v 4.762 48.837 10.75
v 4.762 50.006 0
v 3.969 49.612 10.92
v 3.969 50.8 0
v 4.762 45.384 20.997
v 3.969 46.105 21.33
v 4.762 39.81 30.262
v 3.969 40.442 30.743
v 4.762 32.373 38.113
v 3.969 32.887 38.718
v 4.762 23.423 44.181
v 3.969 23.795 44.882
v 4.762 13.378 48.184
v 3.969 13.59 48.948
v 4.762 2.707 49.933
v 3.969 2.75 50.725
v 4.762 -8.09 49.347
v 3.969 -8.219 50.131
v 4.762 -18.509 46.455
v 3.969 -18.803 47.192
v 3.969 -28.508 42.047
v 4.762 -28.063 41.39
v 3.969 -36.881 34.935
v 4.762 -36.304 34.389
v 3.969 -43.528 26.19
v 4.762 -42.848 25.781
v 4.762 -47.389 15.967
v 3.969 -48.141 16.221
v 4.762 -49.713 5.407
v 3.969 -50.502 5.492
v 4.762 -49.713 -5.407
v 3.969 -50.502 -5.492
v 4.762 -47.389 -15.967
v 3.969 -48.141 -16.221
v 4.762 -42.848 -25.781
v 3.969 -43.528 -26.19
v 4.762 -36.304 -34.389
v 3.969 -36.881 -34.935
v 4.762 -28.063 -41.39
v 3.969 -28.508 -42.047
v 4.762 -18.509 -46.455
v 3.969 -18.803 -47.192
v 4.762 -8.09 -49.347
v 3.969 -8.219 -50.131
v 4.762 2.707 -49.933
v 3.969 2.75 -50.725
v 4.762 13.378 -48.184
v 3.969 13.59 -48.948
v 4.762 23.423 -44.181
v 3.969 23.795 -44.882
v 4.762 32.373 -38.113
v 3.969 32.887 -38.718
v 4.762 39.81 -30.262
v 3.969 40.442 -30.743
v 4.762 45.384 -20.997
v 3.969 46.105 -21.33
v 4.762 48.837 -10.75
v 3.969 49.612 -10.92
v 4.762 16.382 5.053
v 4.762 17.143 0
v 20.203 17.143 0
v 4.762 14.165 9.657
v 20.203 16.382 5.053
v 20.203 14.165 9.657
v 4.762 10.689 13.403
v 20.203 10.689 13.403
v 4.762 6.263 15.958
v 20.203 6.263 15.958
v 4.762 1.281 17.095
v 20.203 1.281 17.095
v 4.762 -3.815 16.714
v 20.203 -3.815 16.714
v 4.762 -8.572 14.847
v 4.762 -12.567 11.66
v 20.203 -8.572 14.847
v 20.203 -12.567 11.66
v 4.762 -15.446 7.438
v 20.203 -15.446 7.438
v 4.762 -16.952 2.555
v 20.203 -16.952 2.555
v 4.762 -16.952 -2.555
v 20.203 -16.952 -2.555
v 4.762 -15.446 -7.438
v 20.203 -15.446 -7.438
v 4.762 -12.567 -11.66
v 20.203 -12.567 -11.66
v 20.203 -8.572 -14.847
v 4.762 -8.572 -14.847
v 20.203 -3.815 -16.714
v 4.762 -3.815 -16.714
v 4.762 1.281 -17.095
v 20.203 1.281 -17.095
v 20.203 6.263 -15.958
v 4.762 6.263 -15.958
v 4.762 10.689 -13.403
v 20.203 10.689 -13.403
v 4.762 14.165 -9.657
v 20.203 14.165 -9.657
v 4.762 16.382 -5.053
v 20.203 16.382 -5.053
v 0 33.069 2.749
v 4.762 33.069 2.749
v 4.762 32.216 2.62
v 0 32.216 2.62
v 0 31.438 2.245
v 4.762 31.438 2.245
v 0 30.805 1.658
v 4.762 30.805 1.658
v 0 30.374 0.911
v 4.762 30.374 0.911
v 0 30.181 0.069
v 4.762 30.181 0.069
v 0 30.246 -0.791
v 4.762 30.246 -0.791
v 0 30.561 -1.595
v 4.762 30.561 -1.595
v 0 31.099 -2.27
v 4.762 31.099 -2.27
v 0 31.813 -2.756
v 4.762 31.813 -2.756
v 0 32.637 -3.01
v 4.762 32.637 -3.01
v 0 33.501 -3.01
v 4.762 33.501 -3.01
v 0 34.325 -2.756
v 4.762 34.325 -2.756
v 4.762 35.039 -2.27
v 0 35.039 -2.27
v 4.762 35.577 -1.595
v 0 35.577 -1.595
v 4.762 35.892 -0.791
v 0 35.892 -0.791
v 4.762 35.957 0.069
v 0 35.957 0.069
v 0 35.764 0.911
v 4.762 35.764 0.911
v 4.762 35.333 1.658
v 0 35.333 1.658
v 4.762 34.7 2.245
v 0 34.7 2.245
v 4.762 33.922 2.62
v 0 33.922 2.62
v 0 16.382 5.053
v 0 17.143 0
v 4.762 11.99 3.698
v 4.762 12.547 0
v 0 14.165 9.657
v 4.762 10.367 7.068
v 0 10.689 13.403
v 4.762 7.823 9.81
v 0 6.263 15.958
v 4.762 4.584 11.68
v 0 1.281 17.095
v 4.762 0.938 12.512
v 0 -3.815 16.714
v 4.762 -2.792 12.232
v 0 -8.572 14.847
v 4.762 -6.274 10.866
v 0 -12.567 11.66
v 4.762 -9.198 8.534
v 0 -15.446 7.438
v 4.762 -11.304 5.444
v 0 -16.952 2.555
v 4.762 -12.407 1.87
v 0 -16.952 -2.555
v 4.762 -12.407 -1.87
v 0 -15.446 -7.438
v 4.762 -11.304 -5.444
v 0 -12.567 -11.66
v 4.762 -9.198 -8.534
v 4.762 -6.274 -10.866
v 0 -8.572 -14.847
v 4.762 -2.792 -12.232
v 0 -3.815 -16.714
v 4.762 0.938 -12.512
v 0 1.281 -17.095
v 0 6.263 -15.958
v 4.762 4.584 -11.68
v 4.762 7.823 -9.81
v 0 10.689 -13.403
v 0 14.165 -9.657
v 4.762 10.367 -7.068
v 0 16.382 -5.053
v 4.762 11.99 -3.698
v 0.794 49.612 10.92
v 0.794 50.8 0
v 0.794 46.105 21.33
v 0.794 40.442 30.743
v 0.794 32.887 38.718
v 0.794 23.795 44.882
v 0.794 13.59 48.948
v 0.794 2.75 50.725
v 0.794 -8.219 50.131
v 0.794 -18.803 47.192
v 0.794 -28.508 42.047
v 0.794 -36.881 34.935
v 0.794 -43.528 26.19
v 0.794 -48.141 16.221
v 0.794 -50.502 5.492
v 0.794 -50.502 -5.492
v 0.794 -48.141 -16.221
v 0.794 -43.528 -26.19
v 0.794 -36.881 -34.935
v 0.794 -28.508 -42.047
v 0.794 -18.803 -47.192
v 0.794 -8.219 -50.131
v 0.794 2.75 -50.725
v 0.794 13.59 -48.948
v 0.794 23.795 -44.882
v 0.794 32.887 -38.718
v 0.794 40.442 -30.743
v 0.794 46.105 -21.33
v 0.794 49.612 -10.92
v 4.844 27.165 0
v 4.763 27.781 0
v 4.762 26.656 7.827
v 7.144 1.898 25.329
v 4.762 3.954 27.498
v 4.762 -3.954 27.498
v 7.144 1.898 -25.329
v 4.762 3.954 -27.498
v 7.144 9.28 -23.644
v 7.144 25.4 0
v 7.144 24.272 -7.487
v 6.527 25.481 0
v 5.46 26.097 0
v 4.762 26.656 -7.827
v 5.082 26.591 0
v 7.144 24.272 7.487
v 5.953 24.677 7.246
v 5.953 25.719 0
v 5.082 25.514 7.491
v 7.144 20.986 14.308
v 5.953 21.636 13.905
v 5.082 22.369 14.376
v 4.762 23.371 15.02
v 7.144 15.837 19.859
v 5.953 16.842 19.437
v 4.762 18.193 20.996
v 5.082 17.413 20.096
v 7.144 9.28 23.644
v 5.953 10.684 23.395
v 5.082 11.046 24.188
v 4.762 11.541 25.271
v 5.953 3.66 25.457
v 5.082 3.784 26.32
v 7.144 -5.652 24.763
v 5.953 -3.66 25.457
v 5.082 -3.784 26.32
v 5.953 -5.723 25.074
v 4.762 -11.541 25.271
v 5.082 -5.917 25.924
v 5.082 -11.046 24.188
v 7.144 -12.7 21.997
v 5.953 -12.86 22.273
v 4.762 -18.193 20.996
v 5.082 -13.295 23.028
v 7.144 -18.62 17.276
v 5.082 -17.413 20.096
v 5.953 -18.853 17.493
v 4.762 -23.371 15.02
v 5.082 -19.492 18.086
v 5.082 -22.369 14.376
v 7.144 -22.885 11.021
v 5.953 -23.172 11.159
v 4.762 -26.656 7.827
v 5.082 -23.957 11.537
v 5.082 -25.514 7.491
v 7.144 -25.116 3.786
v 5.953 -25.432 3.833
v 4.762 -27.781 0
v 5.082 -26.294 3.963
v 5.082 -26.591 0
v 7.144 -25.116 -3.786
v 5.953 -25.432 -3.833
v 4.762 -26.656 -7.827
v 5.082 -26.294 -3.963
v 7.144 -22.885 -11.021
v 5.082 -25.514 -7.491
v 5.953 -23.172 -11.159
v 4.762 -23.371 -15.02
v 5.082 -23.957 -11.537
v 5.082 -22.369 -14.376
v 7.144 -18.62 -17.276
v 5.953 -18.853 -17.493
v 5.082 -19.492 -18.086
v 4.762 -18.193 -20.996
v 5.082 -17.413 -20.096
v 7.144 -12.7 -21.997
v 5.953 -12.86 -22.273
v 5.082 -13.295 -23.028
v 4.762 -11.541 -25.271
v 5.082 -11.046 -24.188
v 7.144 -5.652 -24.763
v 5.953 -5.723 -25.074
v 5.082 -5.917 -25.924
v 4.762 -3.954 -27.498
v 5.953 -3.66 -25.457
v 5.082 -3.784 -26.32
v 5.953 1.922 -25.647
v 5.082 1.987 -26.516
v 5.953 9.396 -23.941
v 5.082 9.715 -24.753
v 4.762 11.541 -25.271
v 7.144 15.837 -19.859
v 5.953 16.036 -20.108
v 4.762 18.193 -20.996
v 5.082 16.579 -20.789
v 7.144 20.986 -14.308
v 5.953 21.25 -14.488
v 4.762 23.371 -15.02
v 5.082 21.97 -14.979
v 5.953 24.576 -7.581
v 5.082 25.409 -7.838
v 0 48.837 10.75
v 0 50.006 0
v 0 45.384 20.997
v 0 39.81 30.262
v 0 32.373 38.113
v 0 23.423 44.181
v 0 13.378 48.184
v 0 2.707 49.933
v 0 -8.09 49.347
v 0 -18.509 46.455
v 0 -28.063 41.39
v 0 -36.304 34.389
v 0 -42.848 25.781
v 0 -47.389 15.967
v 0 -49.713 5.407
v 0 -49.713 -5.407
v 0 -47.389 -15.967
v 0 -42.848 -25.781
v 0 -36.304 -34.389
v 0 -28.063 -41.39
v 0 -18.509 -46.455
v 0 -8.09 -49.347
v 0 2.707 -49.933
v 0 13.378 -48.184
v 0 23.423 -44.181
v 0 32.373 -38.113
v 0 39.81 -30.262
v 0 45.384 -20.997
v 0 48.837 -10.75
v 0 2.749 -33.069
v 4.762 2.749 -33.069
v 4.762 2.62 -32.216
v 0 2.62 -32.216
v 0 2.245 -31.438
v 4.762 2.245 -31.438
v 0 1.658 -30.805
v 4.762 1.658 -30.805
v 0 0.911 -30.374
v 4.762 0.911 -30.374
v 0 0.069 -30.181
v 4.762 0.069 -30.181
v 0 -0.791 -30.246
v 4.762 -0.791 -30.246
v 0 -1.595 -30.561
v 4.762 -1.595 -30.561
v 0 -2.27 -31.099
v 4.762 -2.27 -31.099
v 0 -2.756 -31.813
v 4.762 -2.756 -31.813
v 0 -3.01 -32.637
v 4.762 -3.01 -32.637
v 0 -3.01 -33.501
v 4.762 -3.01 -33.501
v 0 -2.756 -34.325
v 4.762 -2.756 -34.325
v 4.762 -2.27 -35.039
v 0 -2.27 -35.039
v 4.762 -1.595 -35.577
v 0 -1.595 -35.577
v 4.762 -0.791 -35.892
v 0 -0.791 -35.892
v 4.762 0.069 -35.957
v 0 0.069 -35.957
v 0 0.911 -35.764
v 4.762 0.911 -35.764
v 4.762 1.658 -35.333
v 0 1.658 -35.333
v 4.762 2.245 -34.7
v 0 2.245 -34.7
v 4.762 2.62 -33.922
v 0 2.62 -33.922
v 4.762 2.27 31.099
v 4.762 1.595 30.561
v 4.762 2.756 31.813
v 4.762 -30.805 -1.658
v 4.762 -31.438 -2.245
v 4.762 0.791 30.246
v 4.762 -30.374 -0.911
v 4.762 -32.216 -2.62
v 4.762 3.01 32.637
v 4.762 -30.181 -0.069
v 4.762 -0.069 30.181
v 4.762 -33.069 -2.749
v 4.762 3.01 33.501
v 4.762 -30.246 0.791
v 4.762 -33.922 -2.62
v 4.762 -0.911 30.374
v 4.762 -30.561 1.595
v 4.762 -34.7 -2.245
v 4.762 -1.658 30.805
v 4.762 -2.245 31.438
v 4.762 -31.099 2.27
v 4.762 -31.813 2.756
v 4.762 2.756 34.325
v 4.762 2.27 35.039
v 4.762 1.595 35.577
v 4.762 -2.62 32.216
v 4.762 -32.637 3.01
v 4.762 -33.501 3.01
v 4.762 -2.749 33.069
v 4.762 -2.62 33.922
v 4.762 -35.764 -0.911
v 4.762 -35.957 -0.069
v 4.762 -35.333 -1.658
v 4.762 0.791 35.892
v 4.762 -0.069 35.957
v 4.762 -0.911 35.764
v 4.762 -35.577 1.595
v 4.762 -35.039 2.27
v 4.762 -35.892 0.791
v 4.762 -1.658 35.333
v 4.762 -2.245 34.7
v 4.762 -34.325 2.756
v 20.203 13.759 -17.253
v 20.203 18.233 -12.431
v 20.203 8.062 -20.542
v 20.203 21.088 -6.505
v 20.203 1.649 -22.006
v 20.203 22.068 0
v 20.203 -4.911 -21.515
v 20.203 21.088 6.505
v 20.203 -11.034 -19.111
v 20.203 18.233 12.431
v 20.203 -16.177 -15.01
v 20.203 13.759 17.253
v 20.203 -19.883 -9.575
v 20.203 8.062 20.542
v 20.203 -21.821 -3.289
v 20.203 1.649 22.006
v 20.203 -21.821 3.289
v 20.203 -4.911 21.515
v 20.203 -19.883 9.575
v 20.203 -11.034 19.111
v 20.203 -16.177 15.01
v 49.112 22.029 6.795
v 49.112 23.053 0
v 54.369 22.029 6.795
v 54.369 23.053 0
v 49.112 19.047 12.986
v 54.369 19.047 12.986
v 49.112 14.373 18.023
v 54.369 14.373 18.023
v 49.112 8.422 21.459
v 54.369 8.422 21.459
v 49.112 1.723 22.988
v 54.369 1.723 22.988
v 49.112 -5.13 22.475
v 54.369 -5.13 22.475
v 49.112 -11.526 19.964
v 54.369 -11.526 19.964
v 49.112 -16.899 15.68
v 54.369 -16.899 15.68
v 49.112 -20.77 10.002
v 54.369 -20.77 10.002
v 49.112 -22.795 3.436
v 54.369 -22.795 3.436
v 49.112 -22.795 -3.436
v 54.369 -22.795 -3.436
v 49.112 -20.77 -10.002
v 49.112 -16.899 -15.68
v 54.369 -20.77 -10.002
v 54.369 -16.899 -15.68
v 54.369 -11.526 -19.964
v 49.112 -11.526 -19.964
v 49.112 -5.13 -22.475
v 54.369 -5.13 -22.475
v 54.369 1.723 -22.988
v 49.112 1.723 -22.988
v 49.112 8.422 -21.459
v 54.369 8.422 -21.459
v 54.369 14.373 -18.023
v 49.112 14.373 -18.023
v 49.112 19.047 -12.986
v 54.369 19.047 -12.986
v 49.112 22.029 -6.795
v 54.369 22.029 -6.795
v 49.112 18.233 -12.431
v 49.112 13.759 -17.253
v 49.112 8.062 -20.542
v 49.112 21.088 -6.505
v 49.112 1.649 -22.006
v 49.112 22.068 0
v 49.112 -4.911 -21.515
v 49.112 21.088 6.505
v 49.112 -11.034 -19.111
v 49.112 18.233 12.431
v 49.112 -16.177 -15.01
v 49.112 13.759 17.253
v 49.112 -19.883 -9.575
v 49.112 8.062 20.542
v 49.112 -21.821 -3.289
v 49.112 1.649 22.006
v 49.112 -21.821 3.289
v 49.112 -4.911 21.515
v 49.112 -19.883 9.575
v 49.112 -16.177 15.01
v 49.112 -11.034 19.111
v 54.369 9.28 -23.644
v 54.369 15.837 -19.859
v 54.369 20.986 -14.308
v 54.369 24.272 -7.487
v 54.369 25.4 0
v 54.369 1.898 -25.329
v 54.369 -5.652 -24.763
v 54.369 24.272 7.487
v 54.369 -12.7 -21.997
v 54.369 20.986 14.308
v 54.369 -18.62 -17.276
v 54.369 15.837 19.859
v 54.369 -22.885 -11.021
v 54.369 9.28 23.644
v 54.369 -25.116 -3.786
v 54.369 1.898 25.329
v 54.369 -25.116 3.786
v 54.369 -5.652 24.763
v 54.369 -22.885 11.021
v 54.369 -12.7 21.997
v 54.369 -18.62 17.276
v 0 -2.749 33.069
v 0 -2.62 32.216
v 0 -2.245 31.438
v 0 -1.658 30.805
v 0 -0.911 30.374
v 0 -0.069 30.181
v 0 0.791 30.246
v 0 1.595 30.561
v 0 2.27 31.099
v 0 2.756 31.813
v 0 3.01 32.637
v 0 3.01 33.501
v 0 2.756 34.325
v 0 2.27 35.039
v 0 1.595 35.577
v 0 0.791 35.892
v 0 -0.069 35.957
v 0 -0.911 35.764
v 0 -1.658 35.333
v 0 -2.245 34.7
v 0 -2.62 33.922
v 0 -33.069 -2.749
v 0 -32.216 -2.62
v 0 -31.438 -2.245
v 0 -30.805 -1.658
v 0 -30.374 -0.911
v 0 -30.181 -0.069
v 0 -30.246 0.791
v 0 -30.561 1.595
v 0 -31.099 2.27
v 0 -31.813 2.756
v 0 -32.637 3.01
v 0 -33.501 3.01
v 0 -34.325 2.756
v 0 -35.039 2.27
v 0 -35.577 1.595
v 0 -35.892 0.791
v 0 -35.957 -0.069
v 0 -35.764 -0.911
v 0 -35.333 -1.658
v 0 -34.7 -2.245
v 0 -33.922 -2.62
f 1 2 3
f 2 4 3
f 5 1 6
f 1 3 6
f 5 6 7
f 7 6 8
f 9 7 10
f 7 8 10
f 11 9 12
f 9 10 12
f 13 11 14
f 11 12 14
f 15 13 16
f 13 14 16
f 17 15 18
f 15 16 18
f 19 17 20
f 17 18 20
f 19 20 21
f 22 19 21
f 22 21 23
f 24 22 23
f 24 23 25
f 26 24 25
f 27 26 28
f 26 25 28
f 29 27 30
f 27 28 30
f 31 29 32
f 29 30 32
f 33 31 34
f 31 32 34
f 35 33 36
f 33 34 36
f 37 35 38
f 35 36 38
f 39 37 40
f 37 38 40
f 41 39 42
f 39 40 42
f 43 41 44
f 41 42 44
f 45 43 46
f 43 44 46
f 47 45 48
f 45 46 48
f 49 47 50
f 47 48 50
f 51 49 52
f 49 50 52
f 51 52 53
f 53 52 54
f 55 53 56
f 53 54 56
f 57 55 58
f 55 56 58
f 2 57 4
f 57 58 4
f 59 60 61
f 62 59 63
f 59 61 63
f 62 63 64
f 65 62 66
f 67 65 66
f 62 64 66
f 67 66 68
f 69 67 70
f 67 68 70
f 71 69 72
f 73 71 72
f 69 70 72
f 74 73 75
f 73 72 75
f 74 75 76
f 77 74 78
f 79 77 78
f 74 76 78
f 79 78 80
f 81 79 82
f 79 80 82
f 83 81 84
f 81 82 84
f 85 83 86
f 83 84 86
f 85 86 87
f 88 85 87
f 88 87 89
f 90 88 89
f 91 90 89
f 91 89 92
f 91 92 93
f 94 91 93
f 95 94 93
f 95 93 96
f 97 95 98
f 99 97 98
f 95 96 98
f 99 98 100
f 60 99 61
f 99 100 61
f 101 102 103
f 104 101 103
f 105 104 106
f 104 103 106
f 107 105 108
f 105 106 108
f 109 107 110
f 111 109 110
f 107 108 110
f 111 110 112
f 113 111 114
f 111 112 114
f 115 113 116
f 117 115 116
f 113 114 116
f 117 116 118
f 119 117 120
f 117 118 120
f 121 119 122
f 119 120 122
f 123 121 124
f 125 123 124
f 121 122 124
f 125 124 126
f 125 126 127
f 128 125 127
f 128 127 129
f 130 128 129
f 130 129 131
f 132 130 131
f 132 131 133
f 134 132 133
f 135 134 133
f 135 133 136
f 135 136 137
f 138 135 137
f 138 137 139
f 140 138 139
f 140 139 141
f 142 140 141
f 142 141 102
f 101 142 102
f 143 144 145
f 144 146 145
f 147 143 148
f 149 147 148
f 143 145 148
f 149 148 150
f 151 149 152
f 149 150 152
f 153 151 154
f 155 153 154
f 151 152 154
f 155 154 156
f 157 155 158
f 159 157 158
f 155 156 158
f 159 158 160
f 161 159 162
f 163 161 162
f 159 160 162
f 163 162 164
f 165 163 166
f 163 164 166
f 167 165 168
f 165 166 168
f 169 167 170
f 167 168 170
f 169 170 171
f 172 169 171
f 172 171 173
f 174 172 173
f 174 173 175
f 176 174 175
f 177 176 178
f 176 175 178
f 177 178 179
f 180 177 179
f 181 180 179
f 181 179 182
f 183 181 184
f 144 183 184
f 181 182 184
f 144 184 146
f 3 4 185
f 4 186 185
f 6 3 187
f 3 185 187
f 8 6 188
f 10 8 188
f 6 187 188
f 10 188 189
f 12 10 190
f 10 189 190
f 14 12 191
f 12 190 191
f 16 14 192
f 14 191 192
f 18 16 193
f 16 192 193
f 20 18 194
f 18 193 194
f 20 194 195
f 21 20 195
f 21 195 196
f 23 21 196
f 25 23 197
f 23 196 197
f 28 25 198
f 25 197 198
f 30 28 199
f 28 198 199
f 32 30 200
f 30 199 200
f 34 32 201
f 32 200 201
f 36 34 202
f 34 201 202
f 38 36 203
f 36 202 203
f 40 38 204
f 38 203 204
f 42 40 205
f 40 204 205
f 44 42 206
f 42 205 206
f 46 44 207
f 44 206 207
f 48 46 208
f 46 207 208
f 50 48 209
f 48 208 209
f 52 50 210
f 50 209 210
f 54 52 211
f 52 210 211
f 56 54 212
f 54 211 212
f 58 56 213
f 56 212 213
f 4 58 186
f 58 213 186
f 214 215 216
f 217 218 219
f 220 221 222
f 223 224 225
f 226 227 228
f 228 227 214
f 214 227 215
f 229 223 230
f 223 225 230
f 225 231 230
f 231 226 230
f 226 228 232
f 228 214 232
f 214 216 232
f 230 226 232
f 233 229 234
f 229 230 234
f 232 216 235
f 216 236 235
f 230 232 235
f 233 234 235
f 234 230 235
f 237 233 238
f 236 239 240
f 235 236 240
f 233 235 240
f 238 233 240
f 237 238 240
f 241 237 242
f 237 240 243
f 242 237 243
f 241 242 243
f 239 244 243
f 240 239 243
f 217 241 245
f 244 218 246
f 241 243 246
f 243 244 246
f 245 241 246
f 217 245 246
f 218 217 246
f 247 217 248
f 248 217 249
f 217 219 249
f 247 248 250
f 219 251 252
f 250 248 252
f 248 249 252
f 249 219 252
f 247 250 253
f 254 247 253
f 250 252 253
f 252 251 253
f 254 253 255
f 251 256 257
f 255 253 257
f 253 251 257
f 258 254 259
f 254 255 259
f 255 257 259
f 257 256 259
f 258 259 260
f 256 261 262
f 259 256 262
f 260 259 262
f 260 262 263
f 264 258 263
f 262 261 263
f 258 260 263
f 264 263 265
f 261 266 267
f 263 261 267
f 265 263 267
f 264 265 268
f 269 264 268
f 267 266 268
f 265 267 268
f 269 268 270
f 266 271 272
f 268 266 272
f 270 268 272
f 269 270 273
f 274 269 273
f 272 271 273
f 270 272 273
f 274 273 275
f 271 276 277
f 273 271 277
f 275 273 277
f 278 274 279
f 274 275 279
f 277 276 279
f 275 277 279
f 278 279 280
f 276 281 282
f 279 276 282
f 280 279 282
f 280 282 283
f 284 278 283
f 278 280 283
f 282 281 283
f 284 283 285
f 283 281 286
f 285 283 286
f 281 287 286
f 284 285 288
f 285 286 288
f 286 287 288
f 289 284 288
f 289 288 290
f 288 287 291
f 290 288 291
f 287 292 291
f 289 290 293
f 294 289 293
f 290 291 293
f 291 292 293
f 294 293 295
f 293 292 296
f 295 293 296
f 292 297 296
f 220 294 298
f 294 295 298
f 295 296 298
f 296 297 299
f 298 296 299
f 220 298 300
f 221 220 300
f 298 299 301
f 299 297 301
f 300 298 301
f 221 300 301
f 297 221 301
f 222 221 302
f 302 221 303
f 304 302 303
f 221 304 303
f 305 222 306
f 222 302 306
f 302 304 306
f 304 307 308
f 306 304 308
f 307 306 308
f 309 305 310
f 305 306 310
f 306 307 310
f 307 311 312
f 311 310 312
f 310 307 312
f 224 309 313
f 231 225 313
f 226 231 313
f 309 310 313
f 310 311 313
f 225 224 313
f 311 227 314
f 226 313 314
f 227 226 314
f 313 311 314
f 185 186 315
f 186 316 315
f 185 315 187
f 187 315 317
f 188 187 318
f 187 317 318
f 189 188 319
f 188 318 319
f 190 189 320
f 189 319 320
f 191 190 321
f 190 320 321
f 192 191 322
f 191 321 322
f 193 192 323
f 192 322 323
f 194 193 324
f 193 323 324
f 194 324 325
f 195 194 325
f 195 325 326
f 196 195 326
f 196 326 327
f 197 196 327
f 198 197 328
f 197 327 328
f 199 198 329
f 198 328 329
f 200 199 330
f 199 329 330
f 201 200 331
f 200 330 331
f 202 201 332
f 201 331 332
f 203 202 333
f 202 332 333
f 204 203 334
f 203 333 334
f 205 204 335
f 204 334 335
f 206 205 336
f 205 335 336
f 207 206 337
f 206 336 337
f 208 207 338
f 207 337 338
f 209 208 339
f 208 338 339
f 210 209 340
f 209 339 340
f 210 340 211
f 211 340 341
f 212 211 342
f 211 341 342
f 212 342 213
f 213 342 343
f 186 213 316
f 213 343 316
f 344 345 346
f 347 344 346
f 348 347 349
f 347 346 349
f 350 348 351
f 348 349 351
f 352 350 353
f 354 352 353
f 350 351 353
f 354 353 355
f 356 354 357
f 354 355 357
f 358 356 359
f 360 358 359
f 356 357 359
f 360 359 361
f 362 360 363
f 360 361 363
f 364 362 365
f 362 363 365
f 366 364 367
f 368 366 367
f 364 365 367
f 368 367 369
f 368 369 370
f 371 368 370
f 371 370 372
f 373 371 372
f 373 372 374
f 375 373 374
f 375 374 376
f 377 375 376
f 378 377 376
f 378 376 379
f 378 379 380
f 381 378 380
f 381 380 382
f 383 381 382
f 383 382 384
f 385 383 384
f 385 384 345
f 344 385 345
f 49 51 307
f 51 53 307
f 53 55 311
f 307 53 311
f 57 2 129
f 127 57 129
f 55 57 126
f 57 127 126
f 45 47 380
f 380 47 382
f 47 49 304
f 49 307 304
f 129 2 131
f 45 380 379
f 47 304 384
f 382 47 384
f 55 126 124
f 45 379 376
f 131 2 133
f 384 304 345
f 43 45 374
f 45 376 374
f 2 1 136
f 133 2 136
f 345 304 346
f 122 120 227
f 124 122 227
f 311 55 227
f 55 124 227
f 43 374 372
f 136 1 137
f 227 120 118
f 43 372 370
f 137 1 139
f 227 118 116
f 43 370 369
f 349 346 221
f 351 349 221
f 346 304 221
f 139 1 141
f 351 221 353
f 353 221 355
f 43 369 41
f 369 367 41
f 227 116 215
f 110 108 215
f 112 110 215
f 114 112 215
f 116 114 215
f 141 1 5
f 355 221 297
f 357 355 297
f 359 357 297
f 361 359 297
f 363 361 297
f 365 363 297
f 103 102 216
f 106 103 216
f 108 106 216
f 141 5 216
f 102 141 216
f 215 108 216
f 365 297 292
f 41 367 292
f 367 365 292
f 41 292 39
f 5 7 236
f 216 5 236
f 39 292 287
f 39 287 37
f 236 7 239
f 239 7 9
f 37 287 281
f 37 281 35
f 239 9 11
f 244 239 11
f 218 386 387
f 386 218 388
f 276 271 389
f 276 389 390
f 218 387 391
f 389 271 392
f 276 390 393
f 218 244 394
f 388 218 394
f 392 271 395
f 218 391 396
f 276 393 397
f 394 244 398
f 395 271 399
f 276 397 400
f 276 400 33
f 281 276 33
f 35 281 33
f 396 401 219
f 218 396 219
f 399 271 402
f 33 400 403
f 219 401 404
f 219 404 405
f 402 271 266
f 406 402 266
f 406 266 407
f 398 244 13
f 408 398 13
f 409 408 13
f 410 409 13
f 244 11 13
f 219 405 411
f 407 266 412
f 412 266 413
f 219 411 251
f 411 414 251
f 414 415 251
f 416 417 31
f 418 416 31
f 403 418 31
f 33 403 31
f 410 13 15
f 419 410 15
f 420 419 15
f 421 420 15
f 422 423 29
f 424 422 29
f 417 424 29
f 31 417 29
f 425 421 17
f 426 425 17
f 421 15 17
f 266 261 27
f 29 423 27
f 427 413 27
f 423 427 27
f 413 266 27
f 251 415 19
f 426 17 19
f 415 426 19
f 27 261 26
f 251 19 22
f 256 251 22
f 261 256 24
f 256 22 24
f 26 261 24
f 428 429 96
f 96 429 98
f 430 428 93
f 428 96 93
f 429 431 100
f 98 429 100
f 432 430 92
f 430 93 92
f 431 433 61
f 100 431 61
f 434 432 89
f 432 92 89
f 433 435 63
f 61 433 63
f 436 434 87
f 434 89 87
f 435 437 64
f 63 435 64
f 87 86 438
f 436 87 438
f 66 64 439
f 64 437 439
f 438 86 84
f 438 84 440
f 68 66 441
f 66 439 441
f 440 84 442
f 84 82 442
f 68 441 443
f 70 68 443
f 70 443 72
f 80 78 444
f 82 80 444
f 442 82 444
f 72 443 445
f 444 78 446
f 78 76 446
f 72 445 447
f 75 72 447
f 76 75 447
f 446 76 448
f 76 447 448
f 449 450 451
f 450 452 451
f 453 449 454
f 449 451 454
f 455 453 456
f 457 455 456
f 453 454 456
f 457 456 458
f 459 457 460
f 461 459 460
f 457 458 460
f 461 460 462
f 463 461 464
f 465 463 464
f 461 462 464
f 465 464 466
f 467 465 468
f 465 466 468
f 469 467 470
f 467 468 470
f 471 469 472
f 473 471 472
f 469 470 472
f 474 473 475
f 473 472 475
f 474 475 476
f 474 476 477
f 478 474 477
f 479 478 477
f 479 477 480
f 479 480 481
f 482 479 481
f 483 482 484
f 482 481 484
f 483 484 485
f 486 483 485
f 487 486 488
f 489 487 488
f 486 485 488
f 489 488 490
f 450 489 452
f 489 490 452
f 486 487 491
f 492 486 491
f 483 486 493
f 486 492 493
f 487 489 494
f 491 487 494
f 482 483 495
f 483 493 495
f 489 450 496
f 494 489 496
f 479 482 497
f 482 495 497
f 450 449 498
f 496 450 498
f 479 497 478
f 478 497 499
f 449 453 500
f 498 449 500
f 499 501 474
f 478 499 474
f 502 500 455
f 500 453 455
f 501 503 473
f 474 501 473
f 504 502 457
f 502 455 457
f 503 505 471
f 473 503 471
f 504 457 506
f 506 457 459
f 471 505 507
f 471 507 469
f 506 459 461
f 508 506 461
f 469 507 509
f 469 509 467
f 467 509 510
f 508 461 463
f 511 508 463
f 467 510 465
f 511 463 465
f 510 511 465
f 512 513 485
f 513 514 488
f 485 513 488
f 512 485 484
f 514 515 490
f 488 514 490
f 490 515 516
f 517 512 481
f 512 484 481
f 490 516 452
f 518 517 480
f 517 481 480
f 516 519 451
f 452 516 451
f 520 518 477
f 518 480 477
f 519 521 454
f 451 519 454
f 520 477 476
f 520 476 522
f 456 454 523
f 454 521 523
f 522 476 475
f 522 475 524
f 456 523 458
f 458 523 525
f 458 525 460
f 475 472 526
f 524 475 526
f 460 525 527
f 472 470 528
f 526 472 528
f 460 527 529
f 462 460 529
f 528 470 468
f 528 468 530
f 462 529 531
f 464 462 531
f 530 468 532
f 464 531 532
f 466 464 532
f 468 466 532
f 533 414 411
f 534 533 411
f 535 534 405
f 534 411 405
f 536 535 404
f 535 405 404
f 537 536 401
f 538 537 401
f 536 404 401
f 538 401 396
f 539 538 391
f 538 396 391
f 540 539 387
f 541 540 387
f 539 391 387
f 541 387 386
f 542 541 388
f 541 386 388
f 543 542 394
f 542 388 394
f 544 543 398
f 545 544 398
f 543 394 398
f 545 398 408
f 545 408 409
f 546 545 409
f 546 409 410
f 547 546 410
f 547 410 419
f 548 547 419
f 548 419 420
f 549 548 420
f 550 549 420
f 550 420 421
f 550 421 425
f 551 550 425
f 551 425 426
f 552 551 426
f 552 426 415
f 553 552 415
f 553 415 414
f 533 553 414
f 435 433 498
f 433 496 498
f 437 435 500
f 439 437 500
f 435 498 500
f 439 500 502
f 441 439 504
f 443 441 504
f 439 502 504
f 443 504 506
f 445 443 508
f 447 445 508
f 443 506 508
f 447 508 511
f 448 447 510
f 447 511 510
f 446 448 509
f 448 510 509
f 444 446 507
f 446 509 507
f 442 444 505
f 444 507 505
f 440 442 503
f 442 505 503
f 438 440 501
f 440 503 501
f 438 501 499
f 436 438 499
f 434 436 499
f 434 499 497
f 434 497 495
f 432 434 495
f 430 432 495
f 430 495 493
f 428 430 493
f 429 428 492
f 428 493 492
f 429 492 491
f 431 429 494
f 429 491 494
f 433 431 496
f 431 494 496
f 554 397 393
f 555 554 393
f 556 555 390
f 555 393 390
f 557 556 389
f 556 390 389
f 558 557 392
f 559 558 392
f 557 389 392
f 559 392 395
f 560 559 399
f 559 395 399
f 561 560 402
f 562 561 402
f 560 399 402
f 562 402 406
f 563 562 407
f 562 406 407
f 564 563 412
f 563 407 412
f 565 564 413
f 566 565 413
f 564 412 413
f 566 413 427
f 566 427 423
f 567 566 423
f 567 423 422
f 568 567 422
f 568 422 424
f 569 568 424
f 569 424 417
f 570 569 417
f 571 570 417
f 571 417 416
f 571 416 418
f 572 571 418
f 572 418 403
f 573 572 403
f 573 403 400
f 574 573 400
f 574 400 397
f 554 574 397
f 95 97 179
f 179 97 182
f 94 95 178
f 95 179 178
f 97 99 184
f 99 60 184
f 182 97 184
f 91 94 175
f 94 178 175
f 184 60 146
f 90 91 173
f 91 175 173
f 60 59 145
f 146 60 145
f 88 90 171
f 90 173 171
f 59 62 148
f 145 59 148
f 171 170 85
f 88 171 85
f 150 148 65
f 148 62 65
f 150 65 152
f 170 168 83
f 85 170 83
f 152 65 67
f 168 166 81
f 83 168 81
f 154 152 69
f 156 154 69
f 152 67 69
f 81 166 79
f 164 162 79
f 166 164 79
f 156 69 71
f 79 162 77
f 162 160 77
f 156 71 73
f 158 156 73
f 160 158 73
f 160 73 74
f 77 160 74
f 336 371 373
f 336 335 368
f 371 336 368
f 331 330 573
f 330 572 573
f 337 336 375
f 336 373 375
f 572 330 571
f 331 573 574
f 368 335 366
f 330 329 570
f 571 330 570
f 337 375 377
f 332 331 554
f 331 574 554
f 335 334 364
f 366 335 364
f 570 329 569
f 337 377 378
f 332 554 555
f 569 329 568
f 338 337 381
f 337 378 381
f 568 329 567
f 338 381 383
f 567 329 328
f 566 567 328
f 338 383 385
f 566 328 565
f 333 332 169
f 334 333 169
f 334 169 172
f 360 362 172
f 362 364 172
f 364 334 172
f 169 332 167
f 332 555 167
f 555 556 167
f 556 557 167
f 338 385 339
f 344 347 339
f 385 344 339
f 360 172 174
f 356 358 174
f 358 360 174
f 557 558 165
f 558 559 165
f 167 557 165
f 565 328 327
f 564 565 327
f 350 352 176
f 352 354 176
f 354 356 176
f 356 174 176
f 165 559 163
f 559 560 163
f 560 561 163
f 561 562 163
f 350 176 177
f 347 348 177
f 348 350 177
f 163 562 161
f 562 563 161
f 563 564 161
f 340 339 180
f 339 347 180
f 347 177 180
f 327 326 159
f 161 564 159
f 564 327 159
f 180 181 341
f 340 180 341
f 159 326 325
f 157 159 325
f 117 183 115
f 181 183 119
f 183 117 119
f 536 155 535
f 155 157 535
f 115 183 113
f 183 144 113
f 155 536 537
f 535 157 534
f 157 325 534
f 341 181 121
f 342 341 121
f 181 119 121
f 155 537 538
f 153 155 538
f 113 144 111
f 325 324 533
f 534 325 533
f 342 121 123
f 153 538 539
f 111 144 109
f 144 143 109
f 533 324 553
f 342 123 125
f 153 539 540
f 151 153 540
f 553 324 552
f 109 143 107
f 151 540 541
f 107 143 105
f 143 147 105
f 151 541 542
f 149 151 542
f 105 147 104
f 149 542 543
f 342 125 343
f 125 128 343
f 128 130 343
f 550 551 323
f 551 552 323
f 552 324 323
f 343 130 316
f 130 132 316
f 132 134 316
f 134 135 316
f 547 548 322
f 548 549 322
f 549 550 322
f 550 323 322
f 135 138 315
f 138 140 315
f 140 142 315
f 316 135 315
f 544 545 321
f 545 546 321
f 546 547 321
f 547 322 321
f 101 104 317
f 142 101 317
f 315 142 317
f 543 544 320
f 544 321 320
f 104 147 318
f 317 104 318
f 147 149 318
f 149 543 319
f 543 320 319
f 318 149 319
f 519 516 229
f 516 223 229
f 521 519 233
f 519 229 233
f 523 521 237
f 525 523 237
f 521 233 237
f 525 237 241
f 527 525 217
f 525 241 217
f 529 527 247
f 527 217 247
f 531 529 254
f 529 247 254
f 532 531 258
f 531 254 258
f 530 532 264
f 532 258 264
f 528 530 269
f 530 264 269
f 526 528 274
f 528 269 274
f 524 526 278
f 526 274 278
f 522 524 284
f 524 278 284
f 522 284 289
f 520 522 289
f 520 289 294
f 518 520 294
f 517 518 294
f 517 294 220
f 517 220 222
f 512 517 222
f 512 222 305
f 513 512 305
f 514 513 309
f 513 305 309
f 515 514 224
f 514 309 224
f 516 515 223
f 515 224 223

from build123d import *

# Parameters (mm, degrees)
F_12_CLEARANCE_HOLE1_D = 5.7912
CIRPATTERN1_COUNT      = 4


with BuildPart() as part:
    # Sketch1 → Revolve1 (revolve)
    with BuildSketch(Plane.XY):
        with BuildLine():
            Line((4.7625, 12.547042688), (4.7625, 17.143351136))
            Line((4.7625, 17.143351136), (20.20283565, 17.143351136))
            Line((20.20283565, 17.143351136), (20.20283565, 22.067968078))
            Line((20.20283565, 22.067968078), (49.112399892, 22.067968078))
            Line((49.112399892, 22.067968078), (49.112399892, 23.05289127))
            Line((49.112399892, 23.05289127), (54.368684681, 23.05289127))
            Line((54.368684681, 23.05289127), (54.368684681, 25.4))
            Line((54.368684681, 25.4), (7.14375, 25.4))
            ThreePointArc((7.14375, 25.4), (5.459951977, 26.097451977), (4.7625, 27.78125))
            Line((4.7625, 27.78125), (4.7625, 50.00625))
            Line((4.7625, 50.00625), (3.96875, 50.8))
            Line((3.96875, 50.8), (0.79375, 50.8))
            Line((0.79375, 50.8), (0, 50.00625))
            Line((0, 50.00625), (0, 17.143351136))
            Line((0, 17.143351136), (4.7625, 12.547042688))
        make_face()
    revolve(axis=Axis((207.498884421, 0, 0), (1, 0, 0)))

    # #12 Clearance Hole1 (through all)
    with Locations(Plane(origin=(0, 33.069002249, -0.146973343), x_dir=(0, 0, -1), z_dir=(-1, 0, 0))):
        with Locations((0, 0)):
            f_12_clearance_hole1 = Hole(F_12_CLEARANCE_HOLE1_D / 2)

    # CirPattern1: #12 Clearance Hole1 ×4 about axis
    cirpattern1_axis = Axis((0, 0, 0), (1, 0, 0))
    for i in range(1, CIRPATTERN1_COUNT):
        add(f_12_clearance_hole1.rotate(cirpattern1_axis, i * 360 / CIRPATTERN1_COUNT), mode=Mode.SUBTRACT)


solid = part.part
